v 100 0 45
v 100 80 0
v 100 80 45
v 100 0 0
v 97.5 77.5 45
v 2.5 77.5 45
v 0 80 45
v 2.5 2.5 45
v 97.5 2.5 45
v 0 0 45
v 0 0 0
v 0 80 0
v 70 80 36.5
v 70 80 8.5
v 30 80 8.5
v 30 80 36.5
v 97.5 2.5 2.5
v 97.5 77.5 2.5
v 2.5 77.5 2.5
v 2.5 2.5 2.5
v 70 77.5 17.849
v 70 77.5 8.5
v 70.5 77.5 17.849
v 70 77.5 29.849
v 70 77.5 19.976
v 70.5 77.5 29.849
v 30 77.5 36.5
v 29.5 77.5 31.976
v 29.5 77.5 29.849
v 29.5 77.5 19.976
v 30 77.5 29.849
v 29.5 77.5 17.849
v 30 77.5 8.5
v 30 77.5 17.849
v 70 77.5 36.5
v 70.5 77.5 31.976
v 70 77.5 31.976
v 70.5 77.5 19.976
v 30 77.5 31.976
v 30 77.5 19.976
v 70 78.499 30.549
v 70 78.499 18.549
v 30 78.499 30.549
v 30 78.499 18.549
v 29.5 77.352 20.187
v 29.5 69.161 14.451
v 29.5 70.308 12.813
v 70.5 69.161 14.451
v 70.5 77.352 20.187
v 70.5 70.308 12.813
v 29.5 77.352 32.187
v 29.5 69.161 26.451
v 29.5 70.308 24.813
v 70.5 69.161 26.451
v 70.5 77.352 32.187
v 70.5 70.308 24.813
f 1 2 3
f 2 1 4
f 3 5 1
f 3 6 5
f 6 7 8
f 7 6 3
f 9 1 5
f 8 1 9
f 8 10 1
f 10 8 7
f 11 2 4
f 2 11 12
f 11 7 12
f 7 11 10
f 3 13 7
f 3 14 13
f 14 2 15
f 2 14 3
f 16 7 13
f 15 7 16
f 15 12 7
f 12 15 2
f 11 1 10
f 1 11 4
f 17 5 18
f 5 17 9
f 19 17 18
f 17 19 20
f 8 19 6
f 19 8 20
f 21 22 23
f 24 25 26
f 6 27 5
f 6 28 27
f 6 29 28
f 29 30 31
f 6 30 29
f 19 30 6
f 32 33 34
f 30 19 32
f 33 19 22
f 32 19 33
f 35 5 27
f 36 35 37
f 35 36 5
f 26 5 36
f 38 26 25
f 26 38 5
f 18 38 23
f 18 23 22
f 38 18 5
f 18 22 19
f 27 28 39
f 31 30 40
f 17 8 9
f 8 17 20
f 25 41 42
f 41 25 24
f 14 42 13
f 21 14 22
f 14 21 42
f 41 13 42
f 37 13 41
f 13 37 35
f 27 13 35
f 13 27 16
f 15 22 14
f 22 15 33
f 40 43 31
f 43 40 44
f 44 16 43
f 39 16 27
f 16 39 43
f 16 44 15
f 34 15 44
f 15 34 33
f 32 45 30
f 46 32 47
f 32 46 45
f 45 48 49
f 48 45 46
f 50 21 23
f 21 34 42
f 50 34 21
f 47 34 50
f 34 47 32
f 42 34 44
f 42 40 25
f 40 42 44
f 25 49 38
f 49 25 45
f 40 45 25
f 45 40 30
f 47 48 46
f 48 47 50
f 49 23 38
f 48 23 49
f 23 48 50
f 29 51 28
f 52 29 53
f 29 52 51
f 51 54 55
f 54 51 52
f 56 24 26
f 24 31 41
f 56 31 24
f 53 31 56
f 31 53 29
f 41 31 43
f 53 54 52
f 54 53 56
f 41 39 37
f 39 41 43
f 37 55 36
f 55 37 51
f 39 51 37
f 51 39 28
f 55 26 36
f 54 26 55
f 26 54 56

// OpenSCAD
$fn = 32;

// ----------------------------------------------------------------------
// Vent box: louvers enclosure
// ----------------------------------------------------------------------

// --- parameters (mm) ---
box_l = 100;              // box length, X
box_w = 80;               // box width, Y
box_h = 45;               // box height, Z
wall_t = 2.5;             // shell wall thickness
win_l = 40;               // vent window width, X
win_h = 28;               // vent window height, Z
slat_t = 2;               // louver slat thickness
slat_d = 10;              // louver slat depth
slat_a = 35;              // louver slat angle, degrees
slat_pitch = 12;          // louver pitch
slat_yc = 73.83;          // slat centreline Y

win_z0 = (box_h - win_h) / 2;  // window lower edge Z
n_slats = 2;  // louver count
slat_z0 = win_z0 + (win_h - (n_slats - 1) * slat_pitch) / 2;

difference() {
  union() {
    difference() {
      cube([box_l, box_w, box_h]);
  translate([wall_t, wall_t, wall_t])
    cube([box_l - 2 * wall_t, box_w - 2 * wall_t, box_h]);
  translate([(box_l - win_l) / 2, box_w - wall_t - 1, win_z0])
    cube([win_l, wall_t + 2, win_h]);
    }
    for (i = [0 : n_slats - 1])
      translate([box_l / 2, slat_yc, slat_z0 + i * slat_pitch])
        rotate([slat_a, 0, 0])
          cube([win_l + 1, slat_d, slat_t], center = true);
  }
}
